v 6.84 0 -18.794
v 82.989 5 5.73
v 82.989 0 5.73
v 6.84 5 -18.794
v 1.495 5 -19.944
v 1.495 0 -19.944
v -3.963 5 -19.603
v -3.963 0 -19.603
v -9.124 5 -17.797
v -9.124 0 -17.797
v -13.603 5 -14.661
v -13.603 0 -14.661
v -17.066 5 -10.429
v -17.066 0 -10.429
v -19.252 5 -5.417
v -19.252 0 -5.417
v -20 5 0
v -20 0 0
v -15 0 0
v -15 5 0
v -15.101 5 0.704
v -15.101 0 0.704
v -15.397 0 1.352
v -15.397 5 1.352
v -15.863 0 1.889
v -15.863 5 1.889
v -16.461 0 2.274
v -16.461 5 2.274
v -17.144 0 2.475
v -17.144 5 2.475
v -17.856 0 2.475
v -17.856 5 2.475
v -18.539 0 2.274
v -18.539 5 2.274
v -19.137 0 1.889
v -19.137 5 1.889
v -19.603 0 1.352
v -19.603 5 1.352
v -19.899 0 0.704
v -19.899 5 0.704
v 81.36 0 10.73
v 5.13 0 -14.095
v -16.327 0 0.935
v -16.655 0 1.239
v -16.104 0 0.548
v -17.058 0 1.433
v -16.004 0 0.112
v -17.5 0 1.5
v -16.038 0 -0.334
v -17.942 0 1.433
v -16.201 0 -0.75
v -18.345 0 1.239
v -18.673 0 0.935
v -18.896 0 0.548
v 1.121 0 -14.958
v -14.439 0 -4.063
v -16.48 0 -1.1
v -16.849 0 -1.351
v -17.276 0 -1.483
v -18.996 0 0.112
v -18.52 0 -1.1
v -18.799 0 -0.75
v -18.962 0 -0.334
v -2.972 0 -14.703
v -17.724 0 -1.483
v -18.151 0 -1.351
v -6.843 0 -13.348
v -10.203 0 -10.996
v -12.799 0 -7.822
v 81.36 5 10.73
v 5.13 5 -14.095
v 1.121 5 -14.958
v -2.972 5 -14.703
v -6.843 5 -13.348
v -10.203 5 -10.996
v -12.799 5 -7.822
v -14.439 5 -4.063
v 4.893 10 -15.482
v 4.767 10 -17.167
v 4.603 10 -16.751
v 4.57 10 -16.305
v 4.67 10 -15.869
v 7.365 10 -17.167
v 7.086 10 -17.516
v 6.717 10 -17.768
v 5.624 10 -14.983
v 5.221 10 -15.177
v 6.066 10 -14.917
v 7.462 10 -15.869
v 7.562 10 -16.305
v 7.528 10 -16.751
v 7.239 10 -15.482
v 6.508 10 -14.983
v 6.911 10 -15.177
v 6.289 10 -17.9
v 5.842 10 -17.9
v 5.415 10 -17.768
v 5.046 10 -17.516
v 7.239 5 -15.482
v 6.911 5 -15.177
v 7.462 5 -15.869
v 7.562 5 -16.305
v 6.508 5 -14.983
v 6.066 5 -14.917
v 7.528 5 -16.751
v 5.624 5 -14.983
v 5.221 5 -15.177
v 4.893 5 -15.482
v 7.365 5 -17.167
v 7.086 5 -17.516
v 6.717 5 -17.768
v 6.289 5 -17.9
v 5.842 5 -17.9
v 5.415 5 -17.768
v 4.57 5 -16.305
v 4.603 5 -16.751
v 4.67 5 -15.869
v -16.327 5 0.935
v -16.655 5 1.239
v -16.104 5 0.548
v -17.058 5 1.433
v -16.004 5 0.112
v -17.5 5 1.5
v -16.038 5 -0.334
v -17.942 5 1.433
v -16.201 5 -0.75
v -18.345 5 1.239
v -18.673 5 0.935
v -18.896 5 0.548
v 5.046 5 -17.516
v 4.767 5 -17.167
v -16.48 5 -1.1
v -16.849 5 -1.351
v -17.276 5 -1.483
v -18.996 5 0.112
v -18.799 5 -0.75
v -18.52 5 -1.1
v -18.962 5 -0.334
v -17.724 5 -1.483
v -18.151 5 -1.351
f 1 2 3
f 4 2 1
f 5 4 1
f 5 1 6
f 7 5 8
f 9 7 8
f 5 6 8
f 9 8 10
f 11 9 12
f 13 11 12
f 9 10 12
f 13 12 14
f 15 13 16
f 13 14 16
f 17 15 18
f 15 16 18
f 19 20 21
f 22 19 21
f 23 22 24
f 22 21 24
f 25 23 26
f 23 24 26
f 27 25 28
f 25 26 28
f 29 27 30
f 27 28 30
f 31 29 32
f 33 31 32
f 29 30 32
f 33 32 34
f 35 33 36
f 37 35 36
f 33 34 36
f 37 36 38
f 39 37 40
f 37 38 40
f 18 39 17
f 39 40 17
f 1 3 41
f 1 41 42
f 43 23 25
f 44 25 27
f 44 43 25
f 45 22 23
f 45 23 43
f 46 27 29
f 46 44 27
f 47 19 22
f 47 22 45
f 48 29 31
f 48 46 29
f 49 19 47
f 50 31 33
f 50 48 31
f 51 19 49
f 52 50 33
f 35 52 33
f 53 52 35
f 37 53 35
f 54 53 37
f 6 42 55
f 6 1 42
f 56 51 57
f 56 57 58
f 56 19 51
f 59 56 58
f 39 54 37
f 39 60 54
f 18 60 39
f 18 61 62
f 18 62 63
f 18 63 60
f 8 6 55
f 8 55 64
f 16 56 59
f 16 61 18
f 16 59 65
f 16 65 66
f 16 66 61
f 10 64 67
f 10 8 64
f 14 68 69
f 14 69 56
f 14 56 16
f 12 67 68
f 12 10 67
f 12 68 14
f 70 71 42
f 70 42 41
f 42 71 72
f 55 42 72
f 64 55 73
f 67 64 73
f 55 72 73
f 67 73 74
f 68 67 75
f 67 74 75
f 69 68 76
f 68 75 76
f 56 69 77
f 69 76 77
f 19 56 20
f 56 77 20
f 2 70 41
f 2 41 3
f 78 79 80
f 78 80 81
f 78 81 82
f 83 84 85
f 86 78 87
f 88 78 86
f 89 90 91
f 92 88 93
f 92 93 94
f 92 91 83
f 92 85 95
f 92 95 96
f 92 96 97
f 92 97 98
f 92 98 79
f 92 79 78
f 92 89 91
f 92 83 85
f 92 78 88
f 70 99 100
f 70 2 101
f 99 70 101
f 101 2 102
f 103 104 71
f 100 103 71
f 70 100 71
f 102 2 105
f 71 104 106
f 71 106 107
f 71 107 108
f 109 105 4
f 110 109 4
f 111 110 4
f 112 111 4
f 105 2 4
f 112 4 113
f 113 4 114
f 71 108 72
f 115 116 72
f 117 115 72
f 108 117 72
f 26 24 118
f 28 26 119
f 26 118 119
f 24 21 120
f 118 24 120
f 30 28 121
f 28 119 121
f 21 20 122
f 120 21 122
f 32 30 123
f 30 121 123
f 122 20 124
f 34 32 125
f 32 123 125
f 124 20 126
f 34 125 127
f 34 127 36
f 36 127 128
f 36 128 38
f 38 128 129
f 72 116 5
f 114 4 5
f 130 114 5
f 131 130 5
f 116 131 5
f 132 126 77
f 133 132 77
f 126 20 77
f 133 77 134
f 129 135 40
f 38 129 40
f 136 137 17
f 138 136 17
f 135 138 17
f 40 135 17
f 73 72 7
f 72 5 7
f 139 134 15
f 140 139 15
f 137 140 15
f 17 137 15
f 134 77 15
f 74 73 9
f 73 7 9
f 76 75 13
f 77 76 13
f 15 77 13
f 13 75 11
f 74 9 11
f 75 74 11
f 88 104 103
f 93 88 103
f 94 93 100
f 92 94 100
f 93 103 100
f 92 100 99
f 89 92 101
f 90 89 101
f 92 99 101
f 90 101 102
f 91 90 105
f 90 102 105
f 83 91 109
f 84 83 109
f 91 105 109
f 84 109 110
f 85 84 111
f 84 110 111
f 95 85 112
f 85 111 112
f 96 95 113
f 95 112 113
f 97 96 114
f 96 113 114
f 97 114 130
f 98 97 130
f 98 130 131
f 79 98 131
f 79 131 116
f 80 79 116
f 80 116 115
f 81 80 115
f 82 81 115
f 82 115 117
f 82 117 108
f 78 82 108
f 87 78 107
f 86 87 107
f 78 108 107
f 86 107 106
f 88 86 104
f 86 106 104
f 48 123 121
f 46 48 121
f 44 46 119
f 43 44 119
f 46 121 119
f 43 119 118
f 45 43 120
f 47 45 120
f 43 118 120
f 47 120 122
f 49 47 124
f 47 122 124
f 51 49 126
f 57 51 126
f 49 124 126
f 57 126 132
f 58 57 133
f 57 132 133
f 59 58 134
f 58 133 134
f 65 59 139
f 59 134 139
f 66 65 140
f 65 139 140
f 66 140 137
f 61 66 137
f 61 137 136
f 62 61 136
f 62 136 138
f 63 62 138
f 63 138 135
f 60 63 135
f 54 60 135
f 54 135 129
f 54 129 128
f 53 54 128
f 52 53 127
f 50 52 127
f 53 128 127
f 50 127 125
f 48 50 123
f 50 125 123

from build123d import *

# Parameters (mm, degrees)
SKETCH1_R           = 20
BOSS_EXTRUDE1_DEPTH = 5
SKETCH2_R           = 15
CUT_EXTRUDE1_DEPTH  = 5
CUT_EXTRUDE2_START  = -5
CUT_EXTRUDE2_DEPTH  = 5
BOSS_EXTRUDE6_DEPTH = 5
BOSS_EXTRUDE7_DEPTH = 5
SKETCH13_R          = 1.5
CUT_EXTRUDE4_DEPTH  = 5
SKETCH14_R          = 1.5
BOSS_EXTRUDE8_DEPTH = 5


with BuildPart() as part:
    # Sketch1 → Boss-Extrude1 (new body)
    with BuildSketch(Plane(origin=(0, 0, 0), x_dir=(1, 0, 0), z_dir=(0, 1, 0))):
        with Locations(Location((0, 0, 0), (0, 0, 270))):
            Circle(SKETCH1_R)
    extrude(amount=BOSS_EXTRUDE1_DEPTH)

    # Sketch2 → Cut-Extrude1 (cut)
    with BuildSketch(Plane(origin=(0, 5, 0), x_dir=(1, 0, 0), z_dir=(0, 1, 0))):
        with Locations(Location((0, 0, 0), (0, 0, 270))):
            Circle(SKETCH2_R)
    extrude(amount=-CUT_EXTRUDE1_DEPTH, mode=Mode.SUBTRACT)

    # Sketch3 → Cut-Extrude2 (cut)
    with BuildSketch(Plane(origin=(0, 5, 0), x_dir=(1, 0, 0), z_dir=(0, 1, 0)).offset(CUT_EXTRUDE2_START)):
        with BuildLine():
            Line((6.840402867, 18.793852416), (0, 0))
            Line((0, 0), (-20, 0))
            ThreePointArc((-20, 0), (11.471528727, -16.383040886), (6.840402867, 18.793852416))
        make_face()
    extrude(amount=CUT_EXTRUDE2_DEPTH, mode=Mode.SUBTRACT)

    # Sketch10 → Boss-Extrude6 (add)
    with BuildSketch(Plane(origin=(0, 5, 0), x_dir=(1, 0, 0), z_dir=(0, 1, 0))):
        Polygon((5.13030215, 14.095389312), (81.360388775, -10.730274846), (82.988726433, -5.730274846), (6.840402867, 18.793852416), align=None)
    extrude(amount=-BOSS_EXTRUDE6_DEPTH)

    # Sketch12 → Boss-Extrude7 (add)
    with BuildSketch(Plane(origin=(0, 5, 0), x_dir=(1, 0, 0), z_dir=(0, 1, 0))):
        with BuildLine():
            Line((-20, 0), (-15, 0))
            ThreePointArc((-15, 0), (-17.5, -2.5), (-20, 0))
        make_face()
    extrude(amount=-BOSS_EXTRUDE7_DEPTH)

    # Sketch13 → Cut-Extrude4 (cut)
    with BuildSketch(Plane(origin=(0, 5, 0), x_dir=(1, 0, 0), z_dir=(0, 1, 0))):
        with Locations(Location((-17.5, 0, 0), (0, 0, 270))):
            Circle(SKETCH13_R)
    extrude(amount=-CUT_EXTRUDE4_DEPTH, mode=Mode.SUBTRACT)

    # Sketch14 → Boss-Extrude8 (add)
    with BuildSketch(Plane(origin=(0, 5, 0), x_dir=(1, 0, 0), z_dir=(0, 1, 0))):
        with Locations(Location((6.065841992, 16.416852345, 0), (0, 0, 270))):
            Circle(SKETCH14_R)
    extrude(amount=BOSS_EXTRUDE8_DEPTH)


solid = part.part
